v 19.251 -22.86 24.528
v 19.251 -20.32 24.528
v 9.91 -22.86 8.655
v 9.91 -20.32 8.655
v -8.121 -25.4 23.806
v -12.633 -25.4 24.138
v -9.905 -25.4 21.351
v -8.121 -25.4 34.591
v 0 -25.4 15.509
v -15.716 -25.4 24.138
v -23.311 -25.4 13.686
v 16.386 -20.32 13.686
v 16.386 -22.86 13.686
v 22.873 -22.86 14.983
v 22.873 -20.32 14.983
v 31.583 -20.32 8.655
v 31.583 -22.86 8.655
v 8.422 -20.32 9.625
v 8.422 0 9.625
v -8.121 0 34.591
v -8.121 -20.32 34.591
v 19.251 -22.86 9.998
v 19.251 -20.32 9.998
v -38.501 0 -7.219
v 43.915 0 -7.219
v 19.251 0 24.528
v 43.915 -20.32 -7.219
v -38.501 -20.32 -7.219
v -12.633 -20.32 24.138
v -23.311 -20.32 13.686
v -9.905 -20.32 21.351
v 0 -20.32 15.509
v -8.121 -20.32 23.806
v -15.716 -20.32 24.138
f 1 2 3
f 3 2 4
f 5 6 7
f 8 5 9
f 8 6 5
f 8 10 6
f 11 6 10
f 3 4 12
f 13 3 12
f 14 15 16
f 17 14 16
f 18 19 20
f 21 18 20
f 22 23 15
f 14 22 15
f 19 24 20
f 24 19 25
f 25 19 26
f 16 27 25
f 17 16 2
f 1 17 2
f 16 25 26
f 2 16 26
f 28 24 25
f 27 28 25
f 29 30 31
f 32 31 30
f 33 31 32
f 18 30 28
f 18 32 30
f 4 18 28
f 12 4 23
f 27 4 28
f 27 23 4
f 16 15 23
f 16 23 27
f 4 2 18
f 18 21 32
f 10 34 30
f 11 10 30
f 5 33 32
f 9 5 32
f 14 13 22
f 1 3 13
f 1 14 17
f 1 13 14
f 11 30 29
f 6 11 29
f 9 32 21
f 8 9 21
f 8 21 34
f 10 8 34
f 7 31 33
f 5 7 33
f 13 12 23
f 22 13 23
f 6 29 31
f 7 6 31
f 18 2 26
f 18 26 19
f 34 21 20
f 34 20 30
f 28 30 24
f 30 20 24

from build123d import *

# Parameters (mm, degrees)
F1_DEPTH = 25.4
F2_DEPTH = 5.08
F4_DEPTH = 5.08
F6_DEPTH = 5.08
F7_DEPTH = 2.54


with BuildPart() as f1:
    # F0 (on Front) → F1 (new body)
    with BuildSketch(Plane.XZ):
        Polygon((8.4221055731, 9.6252635121), (-8.1213163212, 34.5907881856), (-38.5010540485, -7.2189471684), (43.9152643085, -7.2189471684), (19.2508431466, 24.5281786139), align=None)
    extrude(amount=F1_DEPTH)

    # F2 (cut): a face of the model
    f2_faces = [f1.faces().sort_by_distance(p)[0] for p in [
        (1.3839184885, -25.4, 6.2098147026),
    ]]
    extrude(f2_faces, amount=-F2_DEPTH, mode=Mode.SUBTRACT)

    # F3 (on face) → F4 (join)
    with BuildSketch(Plane.XZ.offset(20.32)):
        Polygon((0, 15.509402017), (-8.1213163212, 34.5907881856), (-15.716250753, 24.1383543471), (-23.3111851849, 13.6859205086), (-12.633157894, 24.1383543471), (-9.9049633738, 21.351277577), (-8.1213163212, 23.8059995994), align=None)
    extrude(amount=F4_DEPTH)

    # F5 (on face) → F6 (join)
    with BuildSketch(Plane.XZ.offset(20.32)):
        Polygon((31.5830537275, 8.6546157228), (19.2508431466, 24.5281786139), (9.9095513281, 8.6546157228), (16.3856597612, 13.6859205086), (19.2508431466, 9.9979629957), (22.8732819398, 14.98329923), align=None)
    extrude(amount=F6_DEPTH)

    # F7 (cut): a face of the model
    f7_faces = [f1.faces().sort_by_distance(p)[0] for p in [
        (19.8070463601, -25.4, 16.0557240809),
    ]]
    extrude(f7_faces, amount=-F7_DEPTH, mode=Mode.SUBTRACT)


solid = f1.part
